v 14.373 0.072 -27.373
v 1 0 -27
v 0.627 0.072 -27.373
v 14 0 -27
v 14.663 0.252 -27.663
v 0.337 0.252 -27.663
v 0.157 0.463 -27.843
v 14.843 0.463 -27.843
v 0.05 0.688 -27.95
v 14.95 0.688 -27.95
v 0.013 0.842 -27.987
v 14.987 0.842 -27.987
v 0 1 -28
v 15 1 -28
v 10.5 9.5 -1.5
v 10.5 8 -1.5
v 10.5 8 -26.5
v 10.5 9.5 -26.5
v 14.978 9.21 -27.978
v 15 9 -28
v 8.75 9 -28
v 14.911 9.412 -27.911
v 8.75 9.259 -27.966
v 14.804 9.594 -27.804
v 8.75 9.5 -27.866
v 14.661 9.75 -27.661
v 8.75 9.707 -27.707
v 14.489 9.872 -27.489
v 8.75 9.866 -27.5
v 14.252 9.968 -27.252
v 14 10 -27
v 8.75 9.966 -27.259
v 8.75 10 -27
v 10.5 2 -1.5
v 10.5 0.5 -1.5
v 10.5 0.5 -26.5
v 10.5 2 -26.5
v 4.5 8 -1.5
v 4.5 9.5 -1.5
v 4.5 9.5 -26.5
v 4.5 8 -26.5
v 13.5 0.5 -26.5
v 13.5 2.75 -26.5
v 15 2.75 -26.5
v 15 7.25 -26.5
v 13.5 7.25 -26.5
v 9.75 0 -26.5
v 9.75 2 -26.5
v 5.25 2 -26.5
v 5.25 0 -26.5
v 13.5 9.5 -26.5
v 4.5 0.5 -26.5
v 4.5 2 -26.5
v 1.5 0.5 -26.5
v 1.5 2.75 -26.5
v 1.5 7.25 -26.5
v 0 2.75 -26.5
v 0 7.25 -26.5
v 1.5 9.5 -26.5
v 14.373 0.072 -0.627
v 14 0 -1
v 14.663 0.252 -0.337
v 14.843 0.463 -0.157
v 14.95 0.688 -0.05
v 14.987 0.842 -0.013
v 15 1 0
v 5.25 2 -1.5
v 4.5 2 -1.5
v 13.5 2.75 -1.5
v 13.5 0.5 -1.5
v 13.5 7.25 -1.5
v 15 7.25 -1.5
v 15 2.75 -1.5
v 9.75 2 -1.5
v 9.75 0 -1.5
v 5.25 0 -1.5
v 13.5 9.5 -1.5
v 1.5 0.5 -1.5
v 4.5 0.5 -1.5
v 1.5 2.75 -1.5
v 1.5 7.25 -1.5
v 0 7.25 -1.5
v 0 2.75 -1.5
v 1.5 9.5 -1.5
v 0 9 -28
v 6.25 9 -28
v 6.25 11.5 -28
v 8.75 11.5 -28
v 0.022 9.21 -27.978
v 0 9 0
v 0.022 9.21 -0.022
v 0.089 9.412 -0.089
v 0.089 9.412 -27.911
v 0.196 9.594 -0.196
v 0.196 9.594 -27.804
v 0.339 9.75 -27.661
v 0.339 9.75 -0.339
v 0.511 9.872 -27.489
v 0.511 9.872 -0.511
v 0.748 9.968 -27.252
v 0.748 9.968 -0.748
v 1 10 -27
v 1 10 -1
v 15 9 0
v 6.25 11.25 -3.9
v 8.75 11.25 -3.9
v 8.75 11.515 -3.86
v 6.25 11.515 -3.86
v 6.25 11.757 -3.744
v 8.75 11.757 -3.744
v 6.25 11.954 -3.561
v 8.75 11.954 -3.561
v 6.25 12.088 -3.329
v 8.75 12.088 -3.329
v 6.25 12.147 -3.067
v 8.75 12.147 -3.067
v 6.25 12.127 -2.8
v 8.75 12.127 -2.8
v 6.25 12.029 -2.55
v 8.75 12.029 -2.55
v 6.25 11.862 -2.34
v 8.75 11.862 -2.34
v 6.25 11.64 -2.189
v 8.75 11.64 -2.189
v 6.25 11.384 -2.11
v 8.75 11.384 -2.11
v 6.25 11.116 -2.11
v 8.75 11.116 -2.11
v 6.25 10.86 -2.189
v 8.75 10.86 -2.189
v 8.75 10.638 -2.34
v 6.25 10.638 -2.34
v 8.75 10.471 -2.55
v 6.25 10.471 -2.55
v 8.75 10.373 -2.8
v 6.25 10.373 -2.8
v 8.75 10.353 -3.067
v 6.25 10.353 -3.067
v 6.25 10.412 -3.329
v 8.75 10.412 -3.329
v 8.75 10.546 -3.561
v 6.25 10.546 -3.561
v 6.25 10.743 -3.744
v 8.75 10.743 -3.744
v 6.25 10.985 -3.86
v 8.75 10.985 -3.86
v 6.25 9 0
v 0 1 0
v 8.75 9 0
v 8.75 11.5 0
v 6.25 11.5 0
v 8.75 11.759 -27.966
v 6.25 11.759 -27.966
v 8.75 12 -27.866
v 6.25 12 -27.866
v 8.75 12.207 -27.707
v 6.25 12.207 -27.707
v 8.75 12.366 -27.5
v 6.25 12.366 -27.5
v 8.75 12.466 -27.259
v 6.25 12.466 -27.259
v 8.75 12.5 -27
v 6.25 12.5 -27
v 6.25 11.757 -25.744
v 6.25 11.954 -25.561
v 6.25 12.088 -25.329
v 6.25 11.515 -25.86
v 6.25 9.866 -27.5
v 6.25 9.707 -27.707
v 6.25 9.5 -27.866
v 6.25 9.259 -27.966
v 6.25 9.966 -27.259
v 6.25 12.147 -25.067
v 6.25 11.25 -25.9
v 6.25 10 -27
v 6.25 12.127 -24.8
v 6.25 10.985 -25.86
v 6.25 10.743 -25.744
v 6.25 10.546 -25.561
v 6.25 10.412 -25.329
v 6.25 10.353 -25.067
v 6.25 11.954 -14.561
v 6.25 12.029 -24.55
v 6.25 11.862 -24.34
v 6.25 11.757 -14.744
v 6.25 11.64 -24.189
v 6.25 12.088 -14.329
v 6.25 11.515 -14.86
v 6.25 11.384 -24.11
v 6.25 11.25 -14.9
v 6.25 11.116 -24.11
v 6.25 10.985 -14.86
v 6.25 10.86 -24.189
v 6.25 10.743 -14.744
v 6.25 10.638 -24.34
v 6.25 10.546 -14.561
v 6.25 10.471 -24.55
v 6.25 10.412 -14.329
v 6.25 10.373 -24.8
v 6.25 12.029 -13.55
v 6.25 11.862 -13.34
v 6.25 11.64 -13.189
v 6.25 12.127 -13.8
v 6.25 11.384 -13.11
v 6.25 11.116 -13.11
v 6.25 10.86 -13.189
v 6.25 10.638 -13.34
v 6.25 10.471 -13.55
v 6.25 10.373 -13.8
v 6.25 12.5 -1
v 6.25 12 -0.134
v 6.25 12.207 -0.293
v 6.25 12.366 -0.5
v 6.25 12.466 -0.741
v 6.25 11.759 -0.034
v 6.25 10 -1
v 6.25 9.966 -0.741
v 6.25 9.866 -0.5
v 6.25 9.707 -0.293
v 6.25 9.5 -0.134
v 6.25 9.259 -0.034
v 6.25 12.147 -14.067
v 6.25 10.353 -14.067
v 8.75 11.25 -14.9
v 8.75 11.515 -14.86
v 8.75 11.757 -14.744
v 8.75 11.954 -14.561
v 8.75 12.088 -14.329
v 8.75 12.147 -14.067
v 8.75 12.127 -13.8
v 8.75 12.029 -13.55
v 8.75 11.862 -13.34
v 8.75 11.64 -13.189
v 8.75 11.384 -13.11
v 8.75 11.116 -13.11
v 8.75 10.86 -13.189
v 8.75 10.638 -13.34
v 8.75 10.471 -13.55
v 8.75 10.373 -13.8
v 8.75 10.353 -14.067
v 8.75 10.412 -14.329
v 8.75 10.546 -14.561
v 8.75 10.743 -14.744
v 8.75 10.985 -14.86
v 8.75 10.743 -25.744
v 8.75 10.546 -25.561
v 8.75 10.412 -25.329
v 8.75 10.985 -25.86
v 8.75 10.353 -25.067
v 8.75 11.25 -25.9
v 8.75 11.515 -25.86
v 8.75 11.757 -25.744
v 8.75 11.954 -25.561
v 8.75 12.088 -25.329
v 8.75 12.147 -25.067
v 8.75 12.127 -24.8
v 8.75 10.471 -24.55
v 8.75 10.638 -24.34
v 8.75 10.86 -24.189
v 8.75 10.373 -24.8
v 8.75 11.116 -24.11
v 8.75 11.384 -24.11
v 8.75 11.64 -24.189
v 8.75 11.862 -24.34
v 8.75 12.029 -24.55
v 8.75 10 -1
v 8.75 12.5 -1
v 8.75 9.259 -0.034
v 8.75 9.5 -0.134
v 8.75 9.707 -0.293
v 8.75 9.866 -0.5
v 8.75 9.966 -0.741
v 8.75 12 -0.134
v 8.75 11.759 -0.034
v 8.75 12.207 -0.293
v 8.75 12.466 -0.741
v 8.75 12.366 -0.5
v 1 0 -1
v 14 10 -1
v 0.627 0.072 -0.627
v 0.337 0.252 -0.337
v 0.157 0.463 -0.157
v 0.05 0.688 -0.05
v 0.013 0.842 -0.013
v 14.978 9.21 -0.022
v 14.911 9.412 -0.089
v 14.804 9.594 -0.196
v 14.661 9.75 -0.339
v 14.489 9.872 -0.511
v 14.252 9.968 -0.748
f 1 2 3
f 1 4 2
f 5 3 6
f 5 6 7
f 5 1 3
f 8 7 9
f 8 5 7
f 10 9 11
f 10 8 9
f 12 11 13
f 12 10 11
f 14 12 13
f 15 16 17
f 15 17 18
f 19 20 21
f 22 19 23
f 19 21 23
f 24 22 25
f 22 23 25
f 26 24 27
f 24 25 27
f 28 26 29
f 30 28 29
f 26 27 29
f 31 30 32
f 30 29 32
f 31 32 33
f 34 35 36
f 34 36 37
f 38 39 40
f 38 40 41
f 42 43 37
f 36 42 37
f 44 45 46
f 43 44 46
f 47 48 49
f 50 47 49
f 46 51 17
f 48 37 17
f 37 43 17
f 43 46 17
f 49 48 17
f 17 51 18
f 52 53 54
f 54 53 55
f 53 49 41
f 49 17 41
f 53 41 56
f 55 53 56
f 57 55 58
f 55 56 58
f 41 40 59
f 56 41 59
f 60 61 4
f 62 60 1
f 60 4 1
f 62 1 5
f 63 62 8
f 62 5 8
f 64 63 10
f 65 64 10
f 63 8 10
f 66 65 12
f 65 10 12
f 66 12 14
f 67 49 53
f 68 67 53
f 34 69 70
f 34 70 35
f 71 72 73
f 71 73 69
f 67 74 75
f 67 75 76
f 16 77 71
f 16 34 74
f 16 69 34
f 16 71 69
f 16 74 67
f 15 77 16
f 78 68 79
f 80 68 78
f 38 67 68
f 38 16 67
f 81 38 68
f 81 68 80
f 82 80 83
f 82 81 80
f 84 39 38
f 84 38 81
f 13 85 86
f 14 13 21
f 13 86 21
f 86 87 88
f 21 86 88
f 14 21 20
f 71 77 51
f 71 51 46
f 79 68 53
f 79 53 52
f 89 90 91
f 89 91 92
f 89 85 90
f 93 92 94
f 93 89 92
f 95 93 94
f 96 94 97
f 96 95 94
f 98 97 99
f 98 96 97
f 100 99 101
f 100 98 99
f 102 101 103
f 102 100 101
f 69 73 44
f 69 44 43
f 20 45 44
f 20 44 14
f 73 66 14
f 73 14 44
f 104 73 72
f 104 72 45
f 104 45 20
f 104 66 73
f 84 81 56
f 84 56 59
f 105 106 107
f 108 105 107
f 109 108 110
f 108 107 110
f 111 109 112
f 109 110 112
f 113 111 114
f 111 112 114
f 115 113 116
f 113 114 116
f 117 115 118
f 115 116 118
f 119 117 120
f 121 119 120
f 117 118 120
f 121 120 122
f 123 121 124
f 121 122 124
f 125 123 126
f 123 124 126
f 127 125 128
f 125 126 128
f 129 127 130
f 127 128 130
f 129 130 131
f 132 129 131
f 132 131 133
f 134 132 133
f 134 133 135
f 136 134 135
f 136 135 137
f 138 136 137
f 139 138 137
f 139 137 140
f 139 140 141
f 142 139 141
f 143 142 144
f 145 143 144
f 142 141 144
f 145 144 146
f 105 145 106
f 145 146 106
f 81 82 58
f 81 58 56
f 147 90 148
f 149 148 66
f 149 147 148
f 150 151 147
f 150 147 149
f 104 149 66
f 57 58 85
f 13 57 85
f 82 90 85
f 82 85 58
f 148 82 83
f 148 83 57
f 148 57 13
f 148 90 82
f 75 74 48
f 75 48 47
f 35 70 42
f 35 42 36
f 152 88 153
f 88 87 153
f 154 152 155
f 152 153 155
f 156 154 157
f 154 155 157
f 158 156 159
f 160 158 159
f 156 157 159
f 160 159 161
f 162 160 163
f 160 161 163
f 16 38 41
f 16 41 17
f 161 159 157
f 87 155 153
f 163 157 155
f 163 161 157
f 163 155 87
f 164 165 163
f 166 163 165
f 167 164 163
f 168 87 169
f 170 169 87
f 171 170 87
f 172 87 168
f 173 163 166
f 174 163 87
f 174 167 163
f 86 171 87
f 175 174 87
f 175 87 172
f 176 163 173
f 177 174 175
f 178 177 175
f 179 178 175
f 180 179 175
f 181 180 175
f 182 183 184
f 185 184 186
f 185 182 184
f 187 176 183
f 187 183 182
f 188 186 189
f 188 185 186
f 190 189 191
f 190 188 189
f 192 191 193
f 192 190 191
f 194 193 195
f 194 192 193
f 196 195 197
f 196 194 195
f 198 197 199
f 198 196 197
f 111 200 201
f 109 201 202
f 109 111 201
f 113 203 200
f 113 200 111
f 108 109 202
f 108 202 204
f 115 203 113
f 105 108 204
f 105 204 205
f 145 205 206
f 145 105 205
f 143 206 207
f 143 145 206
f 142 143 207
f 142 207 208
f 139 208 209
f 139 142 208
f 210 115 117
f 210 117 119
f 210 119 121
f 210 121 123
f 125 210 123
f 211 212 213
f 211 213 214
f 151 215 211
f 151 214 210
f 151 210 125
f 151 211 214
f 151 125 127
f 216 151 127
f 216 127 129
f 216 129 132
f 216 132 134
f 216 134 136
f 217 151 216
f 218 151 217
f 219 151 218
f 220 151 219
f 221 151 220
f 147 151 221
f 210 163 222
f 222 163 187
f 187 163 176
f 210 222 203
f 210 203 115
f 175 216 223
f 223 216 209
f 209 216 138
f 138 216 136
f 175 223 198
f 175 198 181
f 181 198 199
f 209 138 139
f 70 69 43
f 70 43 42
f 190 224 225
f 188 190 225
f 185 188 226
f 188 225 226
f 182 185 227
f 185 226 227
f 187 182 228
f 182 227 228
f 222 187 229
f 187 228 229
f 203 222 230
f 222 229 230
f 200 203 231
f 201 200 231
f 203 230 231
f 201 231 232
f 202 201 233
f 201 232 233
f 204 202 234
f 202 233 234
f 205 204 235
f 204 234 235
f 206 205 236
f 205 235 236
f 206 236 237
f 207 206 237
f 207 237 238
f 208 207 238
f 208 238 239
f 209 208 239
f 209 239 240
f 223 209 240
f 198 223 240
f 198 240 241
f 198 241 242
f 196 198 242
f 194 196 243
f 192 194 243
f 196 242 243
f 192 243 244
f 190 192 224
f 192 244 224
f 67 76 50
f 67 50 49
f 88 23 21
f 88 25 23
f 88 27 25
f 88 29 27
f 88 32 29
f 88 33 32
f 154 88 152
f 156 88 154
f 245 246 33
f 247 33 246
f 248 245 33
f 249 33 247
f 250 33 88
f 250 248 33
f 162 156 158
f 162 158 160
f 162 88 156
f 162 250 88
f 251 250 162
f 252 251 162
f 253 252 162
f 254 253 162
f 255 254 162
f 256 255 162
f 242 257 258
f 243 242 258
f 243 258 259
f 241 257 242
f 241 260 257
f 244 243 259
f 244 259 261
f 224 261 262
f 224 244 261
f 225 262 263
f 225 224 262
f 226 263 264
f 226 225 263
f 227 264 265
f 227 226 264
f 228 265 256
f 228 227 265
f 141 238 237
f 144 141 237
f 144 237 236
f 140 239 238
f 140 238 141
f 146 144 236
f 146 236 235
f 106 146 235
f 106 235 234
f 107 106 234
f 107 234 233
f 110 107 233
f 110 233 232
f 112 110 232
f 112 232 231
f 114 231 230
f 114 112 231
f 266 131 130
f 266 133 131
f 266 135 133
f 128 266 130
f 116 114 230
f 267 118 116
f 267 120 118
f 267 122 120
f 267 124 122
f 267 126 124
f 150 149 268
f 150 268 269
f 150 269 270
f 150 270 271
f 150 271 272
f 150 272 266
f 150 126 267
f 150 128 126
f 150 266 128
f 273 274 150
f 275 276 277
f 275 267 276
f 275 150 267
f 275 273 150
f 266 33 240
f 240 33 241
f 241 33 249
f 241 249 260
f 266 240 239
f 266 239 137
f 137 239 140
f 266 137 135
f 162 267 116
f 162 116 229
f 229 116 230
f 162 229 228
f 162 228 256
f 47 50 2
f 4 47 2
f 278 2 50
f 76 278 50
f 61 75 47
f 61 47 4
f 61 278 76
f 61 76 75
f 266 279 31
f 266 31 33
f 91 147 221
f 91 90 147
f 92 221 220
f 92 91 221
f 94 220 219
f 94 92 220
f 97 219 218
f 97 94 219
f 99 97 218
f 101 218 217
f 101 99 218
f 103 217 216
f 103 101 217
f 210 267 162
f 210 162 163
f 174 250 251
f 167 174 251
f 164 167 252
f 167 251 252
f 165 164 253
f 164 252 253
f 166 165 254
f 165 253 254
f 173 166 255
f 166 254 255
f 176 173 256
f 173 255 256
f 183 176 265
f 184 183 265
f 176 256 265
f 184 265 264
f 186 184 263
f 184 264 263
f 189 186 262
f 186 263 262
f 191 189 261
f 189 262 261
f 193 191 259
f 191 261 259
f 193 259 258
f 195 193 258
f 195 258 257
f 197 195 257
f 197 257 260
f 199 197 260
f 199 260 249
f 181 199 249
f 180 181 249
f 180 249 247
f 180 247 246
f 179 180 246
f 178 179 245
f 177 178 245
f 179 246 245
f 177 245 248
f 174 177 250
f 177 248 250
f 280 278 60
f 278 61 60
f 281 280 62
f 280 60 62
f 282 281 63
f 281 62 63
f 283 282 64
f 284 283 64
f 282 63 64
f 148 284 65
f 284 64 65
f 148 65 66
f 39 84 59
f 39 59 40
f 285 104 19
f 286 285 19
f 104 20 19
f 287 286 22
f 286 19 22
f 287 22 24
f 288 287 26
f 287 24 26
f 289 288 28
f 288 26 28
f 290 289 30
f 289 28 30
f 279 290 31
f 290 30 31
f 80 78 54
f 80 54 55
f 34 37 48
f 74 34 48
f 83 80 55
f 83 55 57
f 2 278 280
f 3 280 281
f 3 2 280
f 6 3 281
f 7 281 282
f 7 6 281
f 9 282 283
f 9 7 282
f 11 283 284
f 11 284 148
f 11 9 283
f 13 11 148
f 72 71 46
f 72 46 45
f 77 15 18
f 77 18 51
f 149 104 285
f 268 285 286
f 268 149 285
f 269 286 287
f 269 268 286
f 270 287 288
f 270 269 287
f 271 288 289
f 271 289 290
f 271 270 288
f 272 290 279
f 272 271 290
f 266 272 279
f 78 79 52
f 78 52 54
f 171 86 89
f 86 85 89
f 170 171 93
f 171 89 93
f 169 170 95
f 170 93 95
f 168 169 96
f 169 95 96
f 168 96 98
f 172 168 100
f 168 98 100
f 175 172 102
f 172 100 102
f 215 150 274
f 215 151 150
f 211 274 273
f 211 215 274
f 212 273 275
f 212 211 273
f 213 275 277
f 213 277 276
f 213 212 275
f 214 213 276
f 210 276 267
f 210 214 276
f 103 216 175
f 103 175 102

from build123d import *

# Parameters (mm, degrees)
BOSS_EXTRUDE1_DEPTH = 28
CUT_EXTRUDE3_START  = -1.5
CUT_EXTRUDE3_DEPTH  = 25
SKETCH3_R           = 0.9
CUT_EXTRUDE2_DEPTH  = 2.5
FILLET2_R           = 1


with BuildPart() as part:
    # Sketch1 → Boss-Extrude1 (new body)
    with BuildSketch(Plane.XY):
        Polygon((0, 0), (15, 0), (15, 10), (8.75, 10), (8.75, 12.5), (6.25, 12.5), (6.25, 10), (0, 10), align=None)
    extrude(amount=-BOSS_EXTRUDE1_DEPTH)

    # Sketch4 → Cut-Extrude3 (cut)
    with BuildSketch(Plane.XY.offset(CUT_EXTRUDE3_START)):
        Polygon((10.5, 8), (10.5, 9.5), (13.5, 9.5), (13.5, 7.25), (15, 7.25), (15, 2.75), (13.5, 2.75), (13.5, 0.5), (10.5, 0.5), (10.5, 2), (9.75, 2), (9.75, 0), (5.25, 0), (5.25, 2), (4.5, 2), (4.5, 0.5), (1.5, 0.5), (1.5, 2.75), (0, 2.75), (0, 7.25), (1.5, 7.25), (1.5, 9.5), (4.5, 9.5), (4.5, 8), align=None)
    extrude(amount=-CUT_EXTRUDE3_DEPTH, mode=Mode.SUBTRACT)

    # Sketch3 → Cut-Extrude2 (cut)
    with BuildSketch(Plane(origin=(8.75, 0, 0), x_dir=(0, 0, -1), z_dir=(1, 0, 0))):
        with Locations((14, 11.25)):
            Circle(SKETCH3_R)
        with Locations((3, 11.25)):
            Circle(SKETCH3_R)
        with Locations((25, 11.25)):
            Circle(SKETCH3_R)
    extrude(amount=-CUT_EXTRUDE2_DEPTH, mode=Mode.SUBTRACT)

    # Fillet2
    fillet2_edges = [part.edges().sort_by_distance(p)[0] for p in [
        (7.5, 0, 0),
        (11.875, 10, -28),
        (0, 10, -14),
        (15, 10, -14),
        (15, 0, -14),
        (0, 0, -14),
        (7.5, 12.5, -28),
        (3.125, 10, -28),
        (7.5, 0, -28),
        (3.125, 10, 0),
        (7.5, 12.5, 0),
        (11.875, 10, 0),
    ]]
    fillet(fillet2_edges, radius=FILLET2_R)


solid = part.part
